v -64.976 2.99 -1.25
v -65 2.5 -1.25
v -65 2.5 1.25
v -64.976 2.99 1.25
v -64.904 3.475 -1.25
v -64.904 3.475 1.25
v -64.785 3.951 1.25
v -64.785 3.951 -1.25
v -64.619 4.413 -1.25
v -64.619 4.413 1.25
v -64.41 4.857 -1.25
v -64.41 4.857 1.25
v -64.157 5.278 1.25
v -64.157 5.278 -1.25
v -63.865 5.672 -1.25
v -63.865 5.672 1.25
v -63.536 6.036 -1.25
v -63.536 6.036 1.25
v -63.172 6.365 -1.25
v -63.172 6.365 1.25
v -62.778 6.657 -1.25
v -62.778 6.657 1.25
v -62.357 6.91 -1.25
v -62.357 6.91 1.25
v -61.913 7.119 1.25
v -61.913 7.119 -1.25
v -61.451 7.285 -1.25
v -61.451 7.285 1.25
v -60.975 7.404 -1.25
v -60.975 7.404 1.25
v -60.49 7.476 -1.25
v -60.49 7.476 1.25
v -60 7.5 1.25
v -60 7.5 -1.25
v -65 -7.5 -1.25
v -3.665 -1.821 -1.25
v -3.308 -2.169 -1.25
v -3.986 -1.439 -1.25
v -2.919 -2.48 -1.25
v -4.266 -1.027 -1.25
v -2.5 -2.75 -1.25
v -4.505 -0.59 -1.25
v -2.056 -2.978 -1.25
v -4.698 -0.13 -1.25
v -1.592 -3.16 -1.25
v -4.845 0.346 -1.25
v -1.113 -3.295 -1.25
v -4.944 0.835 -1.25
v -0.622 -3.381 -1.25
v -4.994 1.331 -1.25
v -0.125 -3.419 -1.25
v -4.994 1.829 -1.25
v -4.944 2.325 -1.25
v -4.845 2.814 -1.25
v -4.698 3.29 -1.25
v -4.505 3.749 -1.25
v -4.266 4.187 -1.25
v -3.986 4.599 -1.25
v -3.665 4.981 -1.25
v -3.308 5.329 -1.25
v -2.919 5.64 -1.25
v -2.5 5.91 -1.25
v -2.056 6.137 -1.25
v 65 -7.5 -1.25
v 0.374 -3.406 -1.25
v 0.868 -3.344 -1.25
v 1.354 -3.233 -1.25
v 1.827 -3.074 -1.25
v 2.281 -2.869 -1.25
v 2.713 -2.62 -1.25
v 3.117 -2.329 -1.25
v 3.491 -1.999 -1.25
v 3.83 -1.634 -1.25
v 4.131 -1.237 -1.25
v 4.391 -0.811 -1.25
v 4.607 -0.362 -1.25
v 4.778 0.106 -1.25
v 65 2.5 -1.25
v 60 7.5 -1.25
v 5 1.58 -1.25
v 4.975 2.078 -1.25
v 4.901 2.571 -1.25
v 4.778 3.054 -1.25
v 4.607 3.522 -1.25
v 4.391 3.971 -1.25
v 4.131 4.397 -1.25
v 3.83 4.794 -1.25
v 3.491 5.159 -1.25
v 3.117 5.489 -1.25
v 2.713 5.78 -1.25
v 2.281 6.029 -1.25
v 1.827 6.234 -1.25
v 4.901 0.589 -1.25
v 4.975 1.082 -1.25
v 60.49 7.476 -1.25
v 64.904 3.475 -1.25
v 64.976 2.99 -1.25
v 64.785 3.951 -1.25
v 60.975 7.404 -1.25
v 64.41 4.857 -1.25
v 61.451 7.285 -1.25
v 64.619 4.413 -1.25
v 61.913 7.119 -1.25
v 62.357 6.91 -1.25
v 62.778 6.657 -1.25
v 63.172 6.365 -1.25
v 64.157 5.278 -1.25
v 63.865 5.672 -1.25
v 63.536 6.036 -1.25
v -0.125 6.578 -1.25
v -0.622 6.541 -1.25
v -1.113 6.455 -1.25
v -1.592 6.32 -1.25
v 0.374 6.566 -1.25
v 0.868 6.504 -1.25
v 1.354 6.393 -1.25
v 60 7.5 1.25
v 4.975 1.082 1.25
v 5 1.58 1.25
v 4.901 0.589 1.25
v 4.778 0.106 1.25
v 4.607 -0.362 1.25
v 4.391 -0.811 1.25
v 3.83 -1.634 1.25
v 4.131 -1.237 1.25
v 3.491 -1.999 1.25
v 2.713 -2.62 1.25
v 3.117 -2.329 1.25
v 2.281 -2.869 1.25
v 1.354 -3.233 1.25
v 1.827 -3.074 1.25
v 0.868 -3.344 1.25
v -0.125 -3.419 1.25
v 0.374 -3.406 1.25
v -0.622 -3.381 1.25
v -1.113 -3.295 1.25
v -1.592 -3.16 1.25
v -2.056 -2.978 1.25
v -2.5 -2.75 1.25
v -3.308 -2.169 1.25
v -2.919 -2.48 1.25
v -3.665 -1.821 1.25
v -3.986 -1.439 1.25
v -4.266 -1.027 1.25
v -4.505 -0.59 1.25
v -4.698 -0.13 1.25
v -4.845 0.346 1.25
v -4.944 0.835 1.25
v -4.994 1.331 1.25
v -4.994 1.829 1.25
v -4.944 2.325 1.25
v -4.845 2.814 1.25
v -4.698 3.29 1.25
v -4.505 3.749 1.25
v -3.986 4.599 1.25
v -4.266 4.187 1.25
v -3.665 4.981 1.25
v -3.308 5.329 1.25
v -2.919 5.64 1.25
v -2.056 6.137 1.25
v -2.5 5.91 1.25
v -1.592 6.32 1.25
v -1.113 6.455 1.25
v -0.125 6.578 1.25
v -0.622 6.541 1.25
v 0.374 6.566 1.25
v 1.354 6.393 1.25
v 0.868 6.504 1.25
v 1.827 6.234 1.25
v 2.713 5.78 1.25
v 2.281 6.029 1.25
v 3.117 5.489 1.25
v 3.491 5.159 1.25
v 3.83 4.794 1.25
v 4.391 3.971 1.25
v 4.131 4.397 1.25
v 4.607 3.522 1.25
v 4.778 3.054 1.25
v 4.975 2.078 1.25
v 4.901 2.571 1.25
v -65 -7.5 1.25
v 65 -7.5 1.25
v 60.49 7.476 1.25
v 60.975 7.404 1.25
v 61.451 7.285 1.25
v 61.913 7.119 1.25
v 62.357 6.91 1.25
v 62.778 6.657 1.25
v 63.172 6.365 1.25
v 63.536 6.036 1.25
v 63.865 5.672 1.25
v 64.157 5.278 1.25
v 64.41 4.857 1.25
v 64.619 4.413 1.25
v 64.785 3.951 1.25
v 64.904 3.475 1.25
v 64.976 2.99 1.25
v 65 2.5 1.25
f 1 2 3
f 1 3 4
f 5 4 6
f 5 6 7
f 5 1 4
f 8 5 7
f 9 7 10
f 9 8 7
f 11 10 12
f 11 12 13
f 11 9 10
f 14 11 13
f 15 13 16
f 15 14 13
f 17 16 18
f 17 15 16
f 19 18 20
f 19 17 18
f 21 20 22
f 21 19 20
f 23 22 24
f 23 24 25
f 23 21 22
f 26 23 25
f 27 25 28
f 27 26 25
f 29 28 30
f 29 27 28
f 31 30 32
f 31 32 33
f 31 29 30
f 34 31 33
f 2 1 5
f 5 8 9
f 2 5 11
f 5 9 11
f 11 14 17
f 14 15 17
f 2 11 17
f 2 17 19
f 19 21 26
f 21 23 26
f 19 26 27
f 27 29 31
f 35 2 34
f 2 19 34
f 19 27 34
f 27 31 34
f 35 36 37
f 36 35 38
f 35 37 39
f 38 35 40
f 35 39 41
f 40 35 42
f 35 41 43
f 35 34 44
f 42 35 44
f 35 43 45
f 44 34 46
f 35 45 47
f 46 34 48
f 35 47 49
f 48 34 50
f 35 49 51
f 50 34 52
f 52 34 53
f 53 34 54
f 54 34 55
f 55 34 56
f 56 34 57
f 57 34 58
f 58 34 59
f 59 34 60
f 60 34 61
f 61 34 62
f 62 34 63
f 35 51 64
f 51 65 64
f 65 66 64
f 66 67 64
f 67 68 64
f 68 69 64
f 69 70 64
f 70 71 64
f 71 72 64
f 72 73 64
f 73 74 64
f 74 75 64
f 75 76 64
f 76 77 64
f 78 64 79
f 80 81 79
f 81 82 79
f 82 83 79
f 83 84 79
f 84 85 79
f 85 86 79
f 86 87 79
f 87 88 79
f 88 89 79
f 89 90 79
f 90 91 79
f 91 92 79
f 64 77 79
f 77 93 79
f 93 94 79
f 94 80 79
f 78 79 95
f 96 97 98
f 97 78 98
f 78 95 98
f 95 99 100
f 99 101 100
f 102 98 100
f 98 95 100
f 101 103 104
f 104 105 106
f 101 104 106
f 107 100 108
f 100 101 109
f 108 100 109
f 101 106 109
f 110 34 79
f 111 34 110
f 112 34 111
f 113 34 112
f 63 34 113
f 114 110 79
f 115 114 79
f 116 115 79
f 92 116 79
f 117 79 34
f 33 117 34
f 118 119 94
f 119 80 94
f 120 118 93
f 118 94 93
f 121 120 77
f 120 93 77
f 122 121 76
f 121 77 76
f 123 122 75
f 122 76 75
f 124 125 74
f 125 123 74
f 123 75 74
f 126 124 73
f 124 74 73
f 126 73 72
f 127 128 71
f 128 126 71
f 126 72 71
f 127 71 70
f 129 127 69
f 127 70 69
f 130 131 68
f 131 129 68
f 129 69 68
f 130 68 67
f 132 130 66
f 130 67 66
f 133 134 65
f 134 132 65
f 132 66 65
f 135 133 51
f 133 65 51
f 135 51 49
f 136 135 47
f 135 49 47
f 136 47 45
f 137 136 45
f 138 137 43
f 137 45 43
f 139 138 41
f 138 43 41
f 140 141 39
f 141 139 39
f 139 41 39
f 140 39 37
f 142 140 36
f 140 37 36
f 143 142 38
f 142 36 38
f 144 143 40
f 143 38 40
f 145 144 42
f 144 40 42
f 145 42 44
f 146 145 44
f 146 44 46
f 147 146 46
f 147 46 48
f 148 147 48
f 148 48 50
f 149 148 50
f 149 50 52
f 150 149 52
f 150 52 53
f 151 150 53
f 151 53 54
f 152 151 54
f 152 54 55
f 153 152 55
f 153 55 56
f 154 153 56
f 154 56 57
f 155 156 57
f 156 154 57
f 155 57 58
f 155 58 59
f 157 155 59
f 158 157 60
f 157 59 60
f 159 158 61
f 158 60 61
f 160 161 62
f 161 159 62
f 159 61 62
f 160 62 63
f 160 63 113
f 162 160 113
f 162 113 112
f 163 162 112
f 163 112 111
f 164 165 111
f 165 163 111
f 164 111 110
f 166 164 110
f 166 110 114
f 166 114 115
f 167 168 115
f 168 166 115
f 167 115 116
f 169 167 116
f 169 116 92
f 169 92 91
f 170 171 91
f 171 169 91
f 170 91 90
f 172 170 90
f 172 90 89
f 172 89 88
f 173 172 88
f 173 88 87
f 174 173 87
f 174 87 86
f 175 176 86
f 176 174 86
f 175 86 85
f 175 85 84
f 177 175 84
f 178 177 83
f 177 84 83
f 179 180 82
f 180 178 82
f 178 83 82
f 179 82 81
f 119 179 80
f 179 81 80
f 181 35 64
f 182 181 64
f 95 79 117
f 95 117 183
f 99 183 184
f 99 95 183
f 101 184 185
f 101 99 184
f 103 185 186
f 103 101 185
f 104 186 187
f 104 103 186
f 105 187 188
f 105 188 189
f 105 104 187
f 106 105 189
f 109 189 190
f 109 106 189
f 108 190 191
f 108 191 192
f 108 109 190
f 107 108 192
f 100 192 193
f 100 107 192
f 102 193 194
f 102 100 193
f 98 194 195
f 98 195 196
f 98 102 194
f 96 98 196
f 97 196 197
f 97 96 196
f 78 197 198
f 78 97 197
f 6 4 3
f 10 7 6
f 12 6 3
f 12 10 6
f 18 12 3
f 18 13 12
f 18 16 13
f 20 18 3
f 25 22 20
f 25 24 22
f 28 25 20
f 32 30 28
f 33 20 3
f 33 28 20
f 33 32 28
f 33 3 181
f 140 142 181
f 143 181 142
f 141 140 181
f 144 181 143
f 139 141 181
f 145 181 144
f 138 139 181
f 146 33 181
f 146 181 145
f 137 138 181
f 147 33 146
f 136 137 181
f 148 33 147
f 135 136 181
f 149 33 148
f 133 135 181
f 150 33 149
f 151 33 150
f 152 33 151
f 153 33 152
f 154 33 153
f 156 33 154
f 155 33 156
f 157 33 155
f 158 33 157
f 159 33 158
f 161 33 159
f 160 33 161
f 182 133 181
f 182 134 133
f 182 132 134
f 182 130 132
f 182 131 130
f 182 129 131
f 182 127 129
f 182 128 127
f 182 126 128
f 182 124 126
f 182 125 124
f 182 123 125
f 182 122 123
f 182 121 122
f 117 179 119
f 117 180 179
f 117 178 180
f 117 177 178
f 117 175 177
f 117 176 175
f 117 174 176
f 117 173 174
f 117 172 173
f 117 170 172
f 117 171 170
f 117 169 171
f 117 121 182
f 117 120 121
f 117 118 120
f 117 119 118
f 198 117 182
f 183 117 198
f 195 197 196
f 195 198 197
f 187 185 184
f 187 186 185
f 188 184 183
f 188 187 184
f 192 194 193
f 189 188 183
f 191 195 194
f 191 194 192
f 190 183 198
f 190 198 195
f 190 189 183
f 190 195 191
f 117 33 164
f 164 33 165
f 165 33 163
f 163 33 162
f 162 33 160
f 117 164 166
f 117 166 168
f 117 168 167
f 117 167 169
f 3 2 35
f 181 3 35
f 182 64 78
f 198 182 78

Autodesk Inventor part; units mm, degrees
ref_plane "YZ Plane" through (0, 0, 0) normal (1, 0, 0) x (0, 1, 0)
ref_plane "XZ Plane" through (0, 0, 0) normal (0, 1, 0) x (-1, 0, 0)
ref_plane "XY Plane" through (0, 0, 0) normal (0, 0, 1) x (1, 0, 0)
sketch "草圖1" plane through (0, 0, 0) normal (0, 0, 1) x (1, 0, 0)
  line L0 (0, 0) -> (-46.9602, 0) construction
  line L1 (0, 0) -> (0, 45.4619) construction
  line L2 (-65, -7.5) -> (65, -7.5)
  line L3 (65, -7.5) -> (65, 7.5)
  line L4 (65, 7.5) -> (-65, 7.5)
  line L5 (-65, 7.5) -> (-65, -7.5)
  line L6 (-65, -7.5) -> (65, 7.5) construction
  line L7 (65, -7.5) -> (-65, 7.5) construction
  circle A0 centre (0, 1.5799) radius 5
  dimension "d0" = 15
  dimension "d1" = 130
  dimension "d5" = 10
extrude "擠出1" add sketch "草圖1" along normal mid plane 2.5
fillet "圓角1" radius 5 2 edges at (-65, 7.5, 0) (65, 7.5, 0)
properties part number "0 零件" material "橡膠"
